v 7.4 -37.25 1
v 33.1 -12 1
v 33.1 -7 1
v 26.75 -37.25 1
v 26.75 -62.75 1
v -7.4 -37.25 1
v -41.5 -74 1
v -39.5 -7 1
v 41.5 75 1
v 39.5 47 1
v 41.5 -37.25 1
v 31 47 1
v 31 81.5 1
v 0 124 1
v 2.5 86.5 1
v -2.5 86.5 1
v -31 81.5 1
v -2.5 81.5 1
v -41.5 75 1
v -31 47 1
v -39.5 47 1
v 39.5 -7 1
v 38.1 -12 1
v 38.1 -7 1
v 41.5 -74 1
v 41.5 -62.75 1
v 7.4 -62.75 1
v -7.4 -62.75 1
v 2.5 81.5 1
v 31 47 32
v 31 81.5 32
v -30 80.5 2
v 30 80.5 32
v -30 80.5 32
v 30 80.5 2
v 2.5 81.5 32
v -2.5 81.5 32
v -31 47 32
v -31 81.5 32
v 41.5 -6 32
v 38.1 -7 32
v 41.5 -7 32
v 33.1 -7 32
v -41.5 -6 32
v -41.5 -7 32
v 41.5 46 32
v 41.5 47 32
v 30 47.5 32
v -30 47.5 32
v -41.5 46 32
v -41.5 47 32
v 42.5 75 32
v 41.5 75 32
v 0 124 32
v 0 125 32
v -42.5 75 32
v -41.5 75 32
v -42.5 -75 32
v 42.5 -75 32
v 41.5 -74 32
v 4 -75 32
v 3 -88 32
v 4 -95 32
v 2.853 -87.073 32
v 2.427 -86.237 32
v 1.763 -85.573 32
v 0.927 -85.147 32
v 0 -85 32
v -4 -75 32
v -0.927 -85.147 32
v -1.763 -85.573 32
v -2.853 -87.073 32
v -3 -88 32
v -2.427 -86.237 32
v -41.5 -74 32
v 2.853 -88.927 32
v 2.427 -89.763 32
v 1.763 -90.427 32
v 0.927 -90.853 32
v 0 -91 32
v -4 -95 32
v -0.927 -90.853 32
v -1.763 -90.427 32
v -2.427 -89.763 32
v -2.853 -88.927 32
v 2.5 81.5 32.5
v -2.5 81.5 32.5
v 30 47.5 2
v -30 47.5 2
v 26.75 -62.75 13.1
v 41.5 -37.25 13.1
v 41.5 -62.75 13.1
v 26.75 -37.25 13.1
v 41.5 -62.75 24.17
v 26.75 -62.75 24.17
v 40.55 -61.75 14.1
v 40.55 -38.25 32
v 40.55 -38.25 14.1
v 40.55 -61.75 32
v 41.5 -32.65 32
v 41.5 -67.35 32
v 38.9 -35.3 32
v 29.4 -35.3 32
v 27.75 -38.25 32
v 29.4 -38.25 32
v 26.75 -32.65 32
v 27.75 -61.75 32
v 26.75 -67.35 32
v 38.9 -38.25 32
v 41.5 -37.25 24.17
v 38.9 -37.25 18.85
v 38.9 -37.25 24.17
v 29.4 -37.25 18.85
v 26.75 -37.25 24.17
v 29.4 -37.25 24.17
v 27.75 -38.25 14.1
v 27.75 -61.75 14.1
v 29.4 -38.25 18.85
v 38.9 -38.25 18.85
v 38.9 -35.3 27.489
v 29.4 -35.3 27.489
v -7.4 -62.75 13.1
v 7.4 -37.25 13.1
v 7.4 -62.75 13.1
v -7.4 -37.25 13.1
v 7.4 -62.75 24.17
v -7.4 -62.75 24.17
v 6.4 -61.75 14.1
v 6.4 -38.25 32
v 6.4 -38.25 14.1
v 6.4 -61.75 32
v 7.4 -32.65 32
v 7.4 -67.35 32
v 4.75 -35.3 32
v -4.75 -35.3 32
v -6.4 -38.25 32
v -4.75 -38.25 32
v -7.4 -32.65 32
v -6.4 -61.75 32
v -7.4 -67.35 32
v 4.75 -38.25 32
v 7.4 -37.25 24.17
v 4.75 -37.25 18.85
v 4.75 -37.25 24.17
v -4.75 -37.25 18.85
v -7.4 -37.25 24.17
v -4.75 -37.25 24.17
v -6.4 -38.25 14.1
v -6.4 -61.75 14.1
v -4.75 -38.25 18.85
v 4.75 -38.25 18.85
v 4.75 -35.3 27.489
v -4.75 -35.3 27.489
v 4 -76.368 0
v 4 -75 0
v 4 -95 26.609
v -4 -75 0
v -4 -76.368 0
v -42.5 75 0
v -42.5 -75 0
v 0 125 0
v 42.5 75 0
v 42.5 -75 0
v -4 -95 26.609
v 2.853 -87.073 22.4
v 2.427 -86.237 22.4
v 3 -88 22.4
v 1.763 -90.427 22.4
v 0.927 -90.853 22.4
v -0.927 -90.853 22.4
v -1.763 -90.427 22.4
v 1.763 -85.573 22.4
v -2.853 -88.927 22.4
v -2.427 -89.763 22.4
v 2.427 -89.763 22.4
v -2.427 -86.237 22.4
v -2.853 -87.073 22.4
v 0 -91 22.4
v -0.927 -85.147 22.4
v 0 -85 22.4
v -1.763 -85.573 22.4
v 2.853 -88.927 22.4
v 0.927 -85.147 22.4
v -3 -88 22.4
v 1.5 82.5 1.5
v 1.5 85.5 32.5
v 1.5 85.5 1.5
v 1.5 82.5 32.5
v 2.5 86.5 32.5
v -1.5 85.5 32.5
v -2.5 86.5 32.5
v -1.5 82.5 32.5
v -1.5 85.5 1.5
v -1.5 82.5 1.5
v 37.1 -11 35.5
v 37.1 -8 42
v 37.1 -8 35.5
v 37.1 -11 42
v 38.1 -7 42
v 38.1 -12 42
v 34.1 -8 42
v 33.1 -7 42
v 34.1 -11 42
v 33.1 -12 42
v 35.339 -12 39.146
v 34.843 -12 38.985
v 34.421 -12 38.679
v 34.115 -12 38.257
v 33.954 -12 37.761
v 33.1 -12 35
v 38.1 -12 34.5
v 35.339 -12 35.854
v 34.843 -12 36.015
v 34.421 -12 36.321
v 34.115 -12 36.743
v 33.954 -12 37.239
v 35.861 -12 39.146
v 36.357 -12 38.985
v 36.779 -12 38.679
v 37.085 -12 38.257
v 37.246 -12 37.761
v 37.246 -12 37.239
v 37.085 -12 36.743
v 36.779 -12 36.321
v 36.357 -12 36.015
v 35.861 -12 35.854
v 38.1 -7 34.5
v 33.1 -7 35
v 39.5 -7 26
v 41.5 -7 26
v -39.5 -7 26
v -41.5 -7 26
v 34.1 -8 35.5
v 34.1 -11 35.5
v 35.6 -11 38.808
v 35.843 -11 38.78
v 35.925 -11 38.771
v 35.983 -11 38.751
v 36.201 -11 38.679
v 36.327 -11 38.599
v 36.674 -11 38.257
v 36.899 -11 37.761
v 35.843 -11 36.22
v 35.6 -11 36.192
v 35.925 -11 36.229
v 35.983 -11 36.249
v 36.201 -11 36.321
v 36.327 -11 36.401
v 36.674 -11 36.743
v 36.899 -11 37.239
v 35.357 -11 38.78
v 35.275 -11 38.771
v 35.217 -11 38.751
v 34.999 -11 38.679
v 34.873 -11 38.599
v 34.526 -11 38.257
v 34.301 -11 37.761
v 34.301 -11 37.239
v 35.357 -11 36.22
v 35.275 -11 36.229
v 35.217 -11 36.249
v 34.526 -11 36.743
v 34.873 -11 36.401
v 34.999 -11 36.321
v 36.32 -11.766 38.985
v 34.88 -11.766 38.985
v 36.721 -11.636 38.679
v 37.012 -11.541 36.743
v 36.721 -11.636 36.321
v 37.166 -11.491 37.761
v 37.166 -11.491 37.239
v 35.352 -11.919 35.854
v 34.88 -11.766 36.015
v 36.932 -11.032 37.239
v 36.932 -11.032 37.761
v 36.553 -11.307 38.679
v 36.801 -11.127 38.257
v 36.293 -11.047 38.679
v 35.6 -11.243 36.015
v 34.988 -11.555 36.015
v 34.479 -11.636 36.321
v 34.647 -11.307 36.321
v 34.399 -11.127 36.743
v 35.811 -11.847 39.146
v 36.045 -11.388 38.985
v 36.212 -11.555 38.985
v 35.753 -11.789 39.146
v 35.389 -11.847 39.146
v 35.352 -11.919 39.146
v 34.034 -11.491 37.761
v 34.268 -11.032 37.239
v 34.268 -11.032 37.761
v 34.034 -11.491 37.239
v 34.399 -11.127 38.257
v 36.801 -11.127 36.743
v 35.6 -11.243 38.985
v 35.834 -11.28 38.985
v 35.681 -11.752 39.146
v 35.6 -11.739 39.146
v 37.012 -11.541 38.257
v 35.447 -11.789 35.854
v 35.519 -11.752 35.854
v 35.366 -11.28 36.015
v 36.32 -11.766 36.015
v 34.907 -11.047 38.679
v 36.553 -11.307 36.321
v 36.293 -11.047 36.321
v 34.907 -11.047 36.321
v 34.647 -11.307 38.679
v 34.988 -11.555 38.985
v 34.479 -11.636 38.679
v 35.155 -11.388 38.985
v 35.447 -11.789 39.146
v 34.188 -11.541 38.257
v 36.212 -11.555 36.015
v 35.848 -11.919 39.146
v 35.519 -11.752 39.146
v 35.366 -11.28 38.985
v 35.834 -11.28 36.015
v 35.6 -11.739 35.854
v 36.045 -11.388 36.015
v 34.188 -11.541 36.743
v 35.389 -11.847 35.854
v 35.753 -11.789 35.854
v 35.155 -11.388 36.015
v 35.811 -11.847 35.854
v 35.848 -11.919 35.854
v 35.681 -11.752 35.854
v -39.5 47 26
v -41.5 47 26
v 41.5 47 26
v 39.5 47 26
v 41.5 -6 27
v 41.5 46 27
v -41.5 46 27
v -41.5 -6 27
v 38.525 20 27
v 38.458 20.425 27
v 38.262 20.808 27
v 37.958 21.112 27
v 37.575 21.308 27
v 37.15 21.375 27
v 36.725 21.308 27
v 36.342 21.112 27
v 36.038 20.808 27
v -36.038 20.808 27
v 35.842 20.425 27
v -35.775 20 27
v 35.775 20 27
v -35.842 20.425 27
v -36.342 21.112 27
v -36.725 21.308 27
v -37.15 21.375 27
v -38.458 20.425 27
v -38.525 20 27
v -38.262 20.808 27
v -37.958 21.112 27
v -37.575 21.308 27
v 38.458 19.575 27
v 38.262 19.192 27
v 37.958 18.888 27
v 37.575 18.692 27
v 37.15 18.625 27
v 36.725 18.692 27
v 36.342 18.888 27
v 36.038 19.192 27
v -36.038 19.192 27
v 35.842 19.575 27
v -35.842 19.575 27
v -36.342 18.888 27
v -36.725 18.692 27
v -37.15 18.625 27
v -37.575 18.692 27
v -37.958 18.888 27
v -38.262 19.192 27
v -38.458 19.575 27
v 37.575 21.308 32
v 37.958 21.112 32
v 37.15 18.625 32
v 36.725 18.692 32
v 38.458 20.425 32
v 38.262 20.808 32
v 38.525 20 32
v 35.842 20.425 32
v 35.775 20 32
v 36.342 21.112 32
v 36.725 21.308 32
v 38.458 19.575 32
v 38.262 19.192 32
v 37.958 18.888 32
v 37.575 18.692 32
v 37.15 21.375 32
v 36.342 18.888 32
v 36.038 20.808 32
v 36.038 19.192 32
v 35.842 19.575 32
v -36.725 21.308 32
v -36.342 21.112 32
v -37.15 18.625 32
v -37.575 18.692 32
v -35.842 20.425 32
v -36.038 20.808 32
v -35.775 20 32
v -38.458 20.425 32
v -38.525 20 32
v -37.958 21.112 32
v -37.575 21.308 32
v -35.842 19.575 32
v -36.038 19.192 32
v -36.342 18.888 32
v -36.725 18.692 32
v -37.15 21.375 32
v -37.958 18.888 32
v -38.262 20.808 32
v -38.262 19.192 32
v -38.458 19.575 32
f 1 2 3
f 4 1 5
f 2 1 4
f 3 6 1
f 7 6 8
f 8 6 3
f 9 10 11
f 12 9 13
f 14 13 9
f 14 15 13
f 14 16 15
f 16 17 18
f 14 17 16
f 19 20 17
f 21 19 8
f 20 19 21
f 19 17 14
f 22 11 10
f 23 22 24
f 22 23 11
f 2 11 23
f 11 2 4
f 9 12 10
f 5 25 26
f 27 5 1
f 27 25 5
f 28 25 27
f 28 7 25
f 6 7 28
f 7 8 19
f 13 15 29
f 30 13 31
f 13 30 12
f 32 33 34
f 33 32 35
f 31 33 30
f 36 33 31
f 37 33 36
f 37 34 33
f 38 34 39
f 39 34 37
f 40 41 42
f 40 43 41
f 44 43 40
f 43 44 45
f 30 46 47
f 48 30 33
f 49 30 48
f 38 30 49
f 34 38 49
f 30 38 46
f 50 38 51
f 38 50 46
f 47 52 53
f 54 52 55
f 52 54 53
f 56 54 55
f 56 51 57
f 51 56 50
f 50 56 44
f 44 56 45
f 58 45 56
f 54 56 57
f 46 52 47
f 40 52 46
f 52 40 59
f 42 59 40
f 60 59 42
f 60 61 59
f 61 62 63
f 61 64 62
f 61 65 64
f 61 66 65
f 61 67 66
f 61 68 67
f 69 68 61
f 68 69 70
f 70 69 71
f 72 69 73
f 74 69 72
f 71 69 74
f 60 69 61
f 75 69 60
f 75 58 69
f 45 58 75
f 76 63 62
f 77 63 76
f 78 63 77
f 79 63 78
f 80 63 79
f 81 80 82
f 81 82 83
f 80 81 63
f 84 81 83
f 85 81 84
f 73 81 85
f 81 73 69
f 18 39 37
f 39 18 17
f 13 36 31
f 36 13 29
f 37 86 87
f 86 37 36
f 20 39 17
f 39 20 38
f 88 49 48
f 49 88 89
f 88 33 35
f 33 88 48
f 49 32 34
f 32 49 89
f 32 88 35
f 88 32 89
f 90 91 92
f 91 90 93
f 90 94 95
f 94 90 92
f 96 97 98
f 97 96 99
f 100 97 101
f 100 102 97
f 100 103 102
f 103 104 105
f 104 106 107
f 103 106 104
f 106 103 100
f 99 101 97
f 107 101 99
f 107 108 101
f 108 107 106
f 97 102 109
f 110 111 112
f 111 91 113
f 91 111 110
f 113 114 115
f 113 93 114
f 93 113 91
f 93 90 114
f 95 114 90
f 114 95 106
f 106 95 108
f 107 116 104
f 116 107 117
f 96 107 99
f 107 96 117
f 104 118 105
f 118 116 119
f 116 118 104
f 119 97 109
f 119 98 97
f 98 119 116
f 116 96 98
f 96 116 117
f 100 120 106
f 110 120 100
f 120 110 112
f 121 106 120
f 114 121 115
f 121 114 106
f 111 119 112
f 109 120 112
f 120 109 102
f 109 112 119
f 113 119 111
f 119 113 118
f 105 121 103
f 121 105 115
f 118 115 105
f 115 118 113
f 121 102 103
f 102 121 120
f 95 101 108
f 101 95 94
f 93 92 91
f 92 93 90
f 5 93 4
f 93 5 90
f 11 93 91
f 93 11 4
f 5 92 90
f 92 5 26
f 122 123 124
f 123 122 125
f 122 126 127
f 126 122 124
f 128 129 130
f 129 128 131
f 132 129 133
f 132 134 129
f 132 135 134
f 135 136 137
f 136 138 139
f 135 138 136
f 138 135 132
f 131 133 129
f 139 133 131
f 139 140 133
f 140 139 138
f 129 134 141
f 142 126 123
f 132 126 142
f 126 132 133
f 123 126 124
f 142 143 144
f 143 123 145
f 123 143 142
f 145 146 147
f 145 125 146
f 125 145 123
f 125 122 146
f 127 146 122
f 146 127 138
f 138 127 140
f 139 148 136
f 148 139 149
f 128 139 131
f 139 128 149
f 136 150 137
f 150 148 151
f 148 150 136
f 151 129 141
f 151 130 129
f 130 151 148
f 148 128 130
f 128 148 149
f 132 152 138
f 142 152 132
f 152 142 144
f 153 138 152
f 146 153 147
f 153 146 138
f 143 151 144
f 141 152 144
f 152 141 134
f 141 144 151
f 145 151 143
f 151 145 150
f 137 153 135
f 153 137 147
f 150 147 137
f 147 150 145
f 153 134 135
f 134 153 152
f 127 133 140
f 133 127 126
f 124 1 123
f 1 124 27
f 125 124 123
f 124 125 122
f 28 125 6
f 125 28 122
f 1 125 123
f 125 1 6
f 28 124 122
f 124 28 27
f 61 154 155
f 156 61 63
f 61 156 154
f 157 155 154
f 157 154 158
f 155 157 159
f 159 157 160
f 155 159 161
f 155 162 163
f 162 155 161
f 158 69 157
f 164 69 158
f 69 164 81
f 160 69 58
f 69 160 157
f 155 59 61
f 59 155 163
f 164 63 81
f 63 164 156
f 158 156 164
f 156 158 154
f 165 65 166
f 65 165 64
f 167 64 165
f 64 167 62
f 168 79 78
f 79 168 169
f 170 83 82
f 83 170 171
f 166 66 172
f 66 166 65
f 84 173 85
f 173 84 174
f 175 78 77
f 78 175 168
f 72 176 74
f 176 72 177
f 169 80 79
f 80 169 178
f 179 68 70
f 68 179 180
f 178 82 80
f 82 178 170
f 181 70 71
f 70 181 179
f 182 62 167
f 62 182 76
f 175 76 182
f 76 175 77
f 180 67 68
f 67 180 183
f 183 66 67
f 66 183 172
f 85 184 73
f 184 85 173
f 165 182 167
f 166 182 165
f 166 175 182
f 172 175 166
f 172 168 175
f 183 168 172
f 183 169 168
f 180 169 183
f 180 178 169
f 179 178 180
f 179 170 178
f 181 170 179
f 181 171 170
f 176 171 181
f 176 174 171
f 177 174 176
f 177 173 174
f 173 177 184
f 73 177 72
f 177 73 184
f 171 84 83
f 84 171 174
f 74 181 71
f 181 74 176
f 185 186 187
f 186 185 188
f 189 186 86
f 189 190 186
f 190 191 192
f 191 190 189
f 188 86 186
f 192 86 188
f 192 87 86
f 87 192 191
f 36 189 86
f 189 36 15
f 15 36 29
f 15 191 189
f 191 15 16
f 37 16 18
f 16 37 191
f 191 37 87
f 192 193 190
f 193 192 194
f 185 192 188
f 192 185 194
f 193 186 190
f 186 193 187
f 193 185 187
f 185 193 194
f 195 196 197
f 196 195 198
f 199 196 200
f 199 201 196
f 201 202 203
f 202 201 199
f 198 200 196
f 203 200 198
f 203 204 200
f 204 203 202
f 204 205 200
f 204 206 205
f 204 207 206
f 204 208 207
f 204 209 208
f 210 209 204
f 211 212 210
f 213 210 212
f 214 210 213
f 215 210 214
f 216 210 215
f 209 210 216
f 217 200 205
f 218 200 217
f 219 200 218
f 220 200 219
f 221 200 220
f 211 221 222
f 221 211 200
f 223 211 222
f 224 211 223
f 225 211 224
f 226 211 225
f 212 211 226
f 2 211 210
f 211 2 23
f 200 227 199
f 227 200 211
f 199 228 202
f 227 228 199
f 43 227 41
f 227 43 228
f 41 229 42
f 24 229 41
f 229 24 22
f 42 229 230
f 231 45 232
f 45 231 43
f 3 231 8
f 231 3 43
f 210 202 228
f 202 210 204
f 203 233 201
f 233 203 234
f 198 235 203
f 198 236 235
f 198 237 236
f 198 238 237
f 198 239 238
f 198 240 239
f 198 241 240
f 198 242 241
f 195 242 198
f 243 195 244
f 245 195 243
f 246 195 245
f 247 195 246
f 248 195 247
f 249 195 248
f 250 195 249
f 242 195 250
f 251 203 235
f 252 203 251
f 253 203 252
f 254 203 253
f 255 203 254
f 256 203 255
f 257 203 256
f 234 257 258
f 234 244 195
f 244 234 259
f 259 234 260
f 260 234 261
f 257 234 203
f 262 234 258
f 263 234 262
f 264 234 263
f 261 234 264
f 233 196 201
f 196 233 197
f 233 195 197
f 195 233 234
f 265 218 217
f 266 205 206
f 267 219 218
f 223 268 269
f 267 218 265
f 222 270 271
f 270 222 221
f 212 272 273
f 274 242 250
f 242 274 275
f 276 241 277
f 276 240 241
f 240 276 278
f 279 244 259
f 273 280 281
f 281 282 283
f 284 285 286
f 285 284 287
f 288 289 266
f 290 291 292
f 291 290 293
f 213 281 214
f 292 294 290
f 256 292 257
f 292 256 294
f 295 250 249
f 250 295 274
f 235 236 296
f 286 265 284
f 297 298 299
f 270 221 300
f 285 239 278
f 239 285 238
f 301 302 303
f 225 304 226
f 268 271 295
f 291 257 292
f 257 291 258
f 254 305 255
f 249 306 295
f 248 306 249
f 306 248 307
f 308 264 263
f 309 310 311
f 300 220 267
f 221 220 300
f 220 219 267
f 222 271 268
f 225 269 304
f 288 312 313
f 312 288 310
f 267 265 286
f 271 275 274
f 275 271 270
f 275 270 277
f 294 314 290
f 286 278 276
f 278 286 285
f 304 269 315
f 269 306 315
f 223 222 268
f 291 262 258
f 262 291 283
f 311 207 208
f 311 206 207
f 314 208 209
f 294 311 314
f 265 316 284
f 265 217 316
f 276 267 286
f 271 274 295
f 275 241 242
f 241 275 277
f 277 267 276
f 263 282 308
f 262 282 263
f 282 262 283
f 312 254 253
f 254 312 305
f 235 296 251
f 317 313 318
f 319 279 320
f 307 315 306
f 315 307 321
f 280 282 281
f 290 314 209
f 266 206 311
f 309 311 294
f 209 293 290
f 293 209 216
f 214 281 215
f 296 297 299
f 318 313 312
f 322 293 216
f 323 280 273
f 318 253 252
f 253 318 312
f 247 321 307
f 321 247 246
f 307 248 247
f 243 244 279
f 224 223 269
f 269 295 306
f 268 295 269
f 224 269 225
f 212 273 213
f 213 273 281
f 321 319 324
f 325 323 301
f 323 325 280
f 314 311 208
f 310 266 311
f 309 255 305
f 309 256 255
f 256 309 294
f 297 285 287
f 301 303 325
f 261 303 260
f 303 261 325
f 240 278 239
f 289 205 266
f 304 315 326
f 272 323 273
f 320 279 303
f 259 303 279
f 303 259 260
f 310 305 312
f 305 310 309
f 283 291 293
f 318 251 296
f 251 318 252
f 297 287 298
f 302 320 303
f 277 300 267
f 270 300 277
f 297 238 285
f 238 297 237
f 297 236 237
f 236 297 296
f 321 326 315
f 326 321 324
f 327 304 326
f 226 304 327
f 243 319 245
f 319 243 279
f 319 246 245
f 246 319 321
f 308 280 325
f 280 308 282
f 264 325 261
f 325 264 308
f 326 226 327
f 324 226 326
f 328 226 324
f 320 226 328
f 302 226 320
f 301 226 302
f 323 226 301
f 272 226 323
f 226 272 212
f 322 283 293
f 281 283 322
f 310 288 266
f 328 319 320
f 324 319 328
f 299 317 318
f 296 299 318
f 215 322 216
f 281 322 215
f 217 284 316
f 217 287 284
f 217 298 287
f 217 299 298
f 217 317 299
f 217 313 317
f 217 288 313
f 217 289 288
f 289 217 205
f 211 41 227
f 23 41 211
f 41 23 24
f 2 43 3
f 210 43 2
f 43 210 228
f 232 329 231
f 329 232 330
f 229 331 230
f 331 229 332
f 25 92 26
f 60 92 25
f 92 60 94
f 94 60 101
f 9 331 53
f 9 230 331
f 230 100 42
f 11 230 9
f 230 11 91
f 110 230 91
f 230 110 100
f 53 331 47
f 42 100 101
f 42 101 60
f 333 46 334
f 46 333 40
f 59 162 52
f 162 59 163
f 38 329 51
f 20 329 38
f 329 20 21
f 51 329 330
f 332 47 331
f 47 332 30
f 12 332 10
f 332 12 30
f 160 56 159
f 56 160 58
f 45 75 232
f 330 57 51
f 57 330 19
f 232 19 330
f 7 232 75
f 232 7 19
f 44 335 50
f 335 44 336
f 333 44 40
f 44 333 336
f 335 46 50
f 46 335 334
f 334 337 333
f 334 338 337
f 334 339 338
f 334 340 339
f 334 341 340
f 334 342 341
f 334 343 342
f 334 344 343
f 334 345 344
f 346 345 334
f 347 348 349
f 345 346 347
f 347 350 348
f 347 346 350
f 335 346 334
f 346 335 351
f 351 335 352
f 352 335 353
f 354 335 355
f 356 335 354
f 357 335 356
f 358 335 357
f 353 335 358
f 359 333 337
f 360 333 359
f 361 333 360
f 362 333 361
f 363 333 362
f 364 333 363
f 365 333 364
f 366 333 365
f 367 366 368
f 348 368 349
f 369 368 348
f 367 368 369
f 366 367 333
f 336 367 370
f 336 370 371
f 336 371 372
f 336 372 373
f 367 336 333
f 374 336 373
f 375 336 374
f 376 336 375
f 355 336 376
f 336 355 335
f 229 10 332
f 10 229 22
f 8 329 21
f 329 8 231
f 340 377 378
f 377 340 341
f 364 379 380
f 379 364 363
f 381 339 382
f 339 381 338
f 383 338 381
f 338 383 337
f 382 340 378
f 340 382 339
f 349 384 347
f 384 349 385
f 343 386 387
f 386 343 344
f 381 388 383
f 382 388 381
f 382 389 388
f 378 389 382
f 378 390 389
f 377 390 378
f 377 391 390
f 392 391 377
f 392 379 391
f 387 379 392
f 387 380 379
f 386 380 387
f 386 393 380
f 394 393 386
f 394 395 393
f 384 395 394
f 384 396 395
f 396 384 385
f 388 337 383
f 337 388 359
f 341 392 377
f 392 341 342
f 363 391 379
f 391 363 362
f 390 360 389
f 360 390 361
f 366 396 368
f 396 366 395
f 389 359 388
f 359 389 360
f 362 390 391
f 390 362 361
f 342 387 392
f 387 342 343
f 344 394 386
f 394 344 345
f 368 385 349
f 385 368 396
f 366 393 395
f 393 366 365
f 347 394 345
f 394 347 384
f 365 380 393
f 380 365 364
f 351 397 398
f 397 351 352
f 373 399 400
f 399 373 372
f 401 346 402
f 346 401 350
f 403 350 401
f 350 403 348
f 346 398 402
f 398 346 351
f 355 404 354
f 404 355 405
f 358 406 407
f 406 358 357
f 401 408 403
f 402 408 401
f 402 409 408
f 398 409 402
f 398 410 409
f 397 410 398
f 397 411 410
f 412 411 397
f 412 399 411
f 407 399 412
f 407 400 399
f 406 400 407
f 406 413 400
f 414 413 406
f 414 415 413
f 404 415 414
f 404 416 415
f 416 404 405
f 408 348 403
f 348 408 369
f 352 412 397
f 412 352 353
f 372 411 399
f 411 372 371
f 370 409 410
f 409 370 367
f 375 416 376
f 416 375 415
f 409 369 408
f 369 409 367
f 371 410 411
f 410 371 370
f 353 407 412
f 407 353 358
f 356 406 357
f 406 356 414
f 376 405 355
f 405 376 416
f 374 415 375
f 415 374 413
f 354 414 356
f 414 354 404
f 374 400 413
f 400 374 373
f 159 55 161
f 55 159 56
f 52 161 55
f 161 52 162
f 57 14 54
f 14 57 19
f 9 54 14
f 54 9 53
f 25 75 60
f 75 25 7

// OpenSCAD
// TODO:
// Widen the spot for protoboard. Switch to 2 pegs, w/ proper diameter. Tray?
// Measure servo horns, ensure enough room for them
// Make mast/boom holes smaller?
// 3 (4?) levels: keel, electronics, deck
// In Blender:
// Rework rudder fin, center of gravity
// Narrow the back of the boat

BOAT_WIDTH = 85;
BOAT_LENGTH = 200;
BOAT_DEPTH = 32;
HULL_THICKNESS = 1;

BATTERY_SIZE_PADDING = 2;
BATTERY_INNER_WIDTH = 32 + BATTERY_SIZE_PADDING;
BATTERY_INNER_LENGTH = 59 + BATTERY_SIZE_PADDING;
BATTERY_INNER_HEIGHT = 28 + BATTERY_SIZE_PADDING;
BATTERY_BOX_THICKNESS = 1;
BATTERY_FORWARD_TRANSLATE = 64;

SERVO_SIZE_PADDING = 2;
SERVO_INNER_WIDTH = 11.8 + SERVO_SIZE_PADDING;
SERVO_INNER_LENGTH = 22.5 + SERVO_SIZE_PADDING;
SERVO_INNER_HEIGHT = 15.9 + SERVO_SIZE_PADDING;
SERVO_BOX_THICKNESS = 1;
SERVO_CONNECTOR_WIDTH = 9.5;

MAST_DIAMETER = 4;
MAST_PADDING = 0.5;
MAST_MOUNT_THICKNESS = 1;
MAST_MOUNT_INNER_DIAMETER = MAST_DIAMETER + 2*(MAST_PADDING);
MAST_HEIGHT = 150;
MAST_FORWARD_TRANSLATE = BATTERY_FORWARD_TRANSLATE + BATTERY_INNER_WIDTH/2 + BATTERY_BOX_THICKNESS/2 + MAST_MOUNT_INNER_DIAMETER/2;

MSR_RAIL_WIDTH = MAST_MOUNT_INNER_DIAMETER*1;
MSR_RAIL_LENGTH = 14;
MSR_RAIL_HEIGHT = 10;

BOOM_LENGTH = BOAT_LENGTH*.75;
RING_OUTER_RADIUS = 3;
RING_INNER_RADIUS = 2;

RAIL_WIDTH = (BOAT_WIDTH-BATTERY_INNER_WIDTH-BATTERY_BOX_THICKNESS)/2-HULL_THICKNESS;
RAIL_LENGTH = 40;
RAIL_HEIGHT = BOAT_DEPTH;

RUDDER_MOUNT_WIDTH = 8;
RUDDER_MOUNT_LENGTH = 20;
RUDDER_WIDTH = RUDDER_MOUNT_WIDTH - 2;
RUDDER_PIVOT_DIAMETER = RUDDER_WIDTH/2;
RUDDER_PIVOT_HOLE_DIAMETER = RUDDER_MOUNT_WIDTH/2 - 1;

CIRCUIT_BOARD_TRAY_THICKNESS = 1;
CIRCUIT_BOARD_WIDTH = 84 + CIRCUIT_BOARD_TRAY_THICKNESS; // measured 81.21
CIRCUIT_BOARD_LENGTH = 53 + CIRCUIT_BOARD_TRAY_THICKNESS; // measured 50.73
CIRCUIT_BOARD_DEPTH = 5 + CIRCUIT_BOARD_TRAY_THICKNESS; // depth of tray, not board
CIRCUIT_BOARD_HOLE_DIAMETER = 2.75; // measured 3.2

//all();
module all() {
  boat();
  mast();
  boom();
  translate([-130, 0, 5]) {
    rotate([0, 90, 90]) {
      rudder();
    }
  }
}

boat();
module boat() {
  hull();
  batteryBox();
  sailServo();
  rudderServo();
  rudderMount();
  mastMount();
  mainSheetRing();
  circuitBoardTray();
}

module hull() {
  aftLength = BOAT_LENGTH * .75;
  foreLength = BOAT_LENGTH - aftLength;
  polyhedron(
    points = [
      // Underside
      [0, aftLength/2 + foreLength, 0],
      [-BOAT_WIDTH/2, aftLength/2, 0],
      [-BOAT_WIDTH/2, -aftLength/2, 0],
      [BOAT_WIDTH/2, -aftLength/2, 0],
      [BOAT_WIDTH/2, aftLength/2, 0],

      // Top outside
      [0, aftLength/2 + foreLength, BOAT_DEPTH],
      [-BOAT_WIDTH/2, aftLength/2, BOAT_DEPTH],
      [-BOAT_WIDTH/2, -aftLength/2, BOAT_DEPTH],
      [BOAT_WIDTH/2, -aftLength/2, BOAT_DEPTH],
      [BOAT_WIDTH/2, aftLength/2, BOAT_DEPTH],

      // Top inside
      [0, aftLength/2 + foreLength - HULL_THICKNESS, BOAT_DEPTH],
      [-BOAT_WIDTH/2+HULL_THICKNESS, aftLength/2, BOAT_DEPTH],
      [-BOAT_WIDTH/2+HULL_THICKNESS, HULL_THICKNESS-aftLength/2, BOAT_DEPTH],
      [BOAT_WIDTH/2-HULL_THICKNESS, HULL_THICKNESS-aftLength/2, BOAT_DEPTH],
      [BOAT_WIDTH/2-HULL_THICKNESS, aftLength/2, BOAT_DEPTH],

      // Floor
      [0, aftLength/2 + foreLength - HULL_THICKNESS, HULL_THICKNESS],
      [-BOAT_WIDTH/2+HULL_THICKNESS, aftLength/2, HULL_THICKNESS],
      [-BOAT_WIDTH/2+HULL_THICKNESS, HULL_THICKNESS-aftLength/2, HULL_THICKNESS],
      [BOAT_WIDTH/2-HULL_THICKNESS, HULL_THICKNESS-aftLength/2, HULL_THICKNESS],
      [BOAT_WIDTH/2-HULL_THICKNESS, aftLength/2, HULL_THICKNESS],
    ],
    faces = [
      // Underside
      [3, 1, 2],
      [3, 4, 1],
      [1, 4, 0],

      // Outer Walls
      [2, 1, 7],
      [7, 1, 6],
      [1, 0, 6],
      [6, 0, 5],
      [0, 4, 5],
      [5, 4, 9],
      [4, 3, 8],
      [8, 9, 4],
      [3, 2, 7],
      [3, 7, 8],

      // Inner Walls
      [12, 11, 17],
      [17, 11, 16],
      [11, 10, 16],
      [16, 10, 15],
      [10, 14, 15],
      [15, 14, 19],
      [14, 13, 18],
      [18, 19, 14],
      [13, 12, 17],
      [13, 17, 18],
      
      // Top of railing
      [8, 14, 9],
      [8, 13, 14],
      [9, 14, 10],
      [9, 10, 5],
      [5, 11, 6],
      [5, 10, 11],
      [7, 6, 11],
      [7, 11, 12],
      [7, 13, 8],
      [7, 12, 13],

      // Floor
      [18, 17, 16],
      [18, 16, 19],
      [16, 15, 19],
    ]
  );
}

module batteryBox() {
  color("red") {
    translate([0, BATTERY_FORWARD_TRANSLATE, HULL_THICKNESS]) {
      rotate([0, 0, 90]) {
        openTopBox(BATTERY_INNER_WIDTH+BATTERY_BOX_THICKNESS,
                   BATTERY_INNER_LENGTH+BATTERY_BOX_THICKNESS,
                   BATTERY_INNER_HEIGHT+BATTERY_BOX_THICKNESS,
                   BATTERY_BOX_THICKNESS);
      }
    }
  }
}

module servoBox() {
  servoOuterHeight = SERVO_INNER_HEIGHT + SERVO_BOX_THICKNESS;
  color("blue") {
    translate([0, 0, BOAT_DEPTH-SERVO_INNER_HEIGHT-HULL_THICKNESS]) {
      difference() {
        union() {
          openTopBox(SERVO_INNER_WIDTH+SERVO_BOX_THICKNESS,
                     SERVO_INNER_LENGTH+SERVO_BOX_THICKNESS,
                     servoOuterHeight, SERVO_BOX_THICKNESS);
          // Wire-side mount
          translate([0,15,14.9]) {
            rotate([0,90,90]) {
              prism(8, SERVO_INNER_WIDTH+SERVO_BOX_THICKNESS, 4.7);
            }
          }
        } //union
        // Connector hole
        translate([SERVO_CONNECTOR_WIDTH*-.5,
                   SERVO_INNER_LENGTH/2 - 1,
                   SERVO_BOX_THICKNESS+4.75]) {
          cube([SERVO_CONNECTOR_WIDTH, 3, 4]);
        }
        // Wire channel cutout
        translate([SERVO_CONNECTOR_WIDTH*-.5, 10, 8]) {
          cube([SERVO_CONNECTOR_WIDTH,
                4.7,
                SERVO_INNER_HEIGHT-6.75], false);
        }
      } //difference
      // Non-wire-side mount
      translate([0,-15,14.9]) {
        rotate([0,90,-90]) {
          prism(8, SERVO_INNER_WIDTH+SERVO_BOX_THICKNESS, 4.7);
        }
      }
    }
    // Stand
    translate([0, 0, (HULL_THICKNESS+BOAT_DEPTH-servoOuterHeight)/2]) {
      cube([SERVO_INNER_WIDTH+SERVO_BOX_THICKNESS, SERVO_INNER_LENGTH+SERVO_BOX_THICKNESS, BOAT_DEPTH-servoOuterHeight-HULL_THICKNESS], true);
    }
  }
}

module sailServo() {
  translate([(BOAT_WIDTH-SERVO_INNER_WIDTH)/2+SERVO_BOX_THICKNESS - 2.45, -50, 0]) {
    servoBox();
  }
}

module rudderServo() {
  translate([0, -50, 0]) {
    servoBox();
  }
}


module mainSheetRing() {
  color("orange") {
    translate([(BOAT_WIDTH-SERVO_INNER_WIDTH)/2, -9.5, BOAT_DEPTH/2+2]) {
        cube([MAST_MOUNT_INNER_DIAMETER,
              MAST_MOUNT_INNER_DIAMETER,
              BOAT_DEPTH+2], true);
    }
    translate([(BOAT_WIDTH-SERVO_INNER_WIDTH)/2, -9.5, BOAT_DEPTH+2.5]) {
      difference() {
        openTopBox(MAST_MOUNT_INNER_DIAMETER,
                   MAST_MOUNT_INNER_DIAMETER,
                   7.5,
                   MAST_MOUNT_THICKNESS);
        translate([0, -MAST_MOUNT_INNER_DIAMETER/2, 3]) {
          sphere(MAST_MOUNT_INNER_DIAMETER/3, $fn=20);
        }
      }
    }
  }
}

module rudderMount() {
  color("orange") {
    translate([0, -79, 0]) {
      translate([-RUDDER_MOUNT_WIDTH/2,
                 4-RUDDER_MOUNT_LENGTH,
                 0]) {
        difference() {
          cube([RUDDER_MOUNT_WIDTH,
                RUDDER_MOUNT_LENGTH,
                BOAT_DEPTH]);
          translate([-20, -20, -32]) {
            rotate([35, 0, 0]) {
              cube([50, 50, 50]);
            }
          }
          translate([RUDDER_MOUNT_WIDTH/2, 7, BOAT_DEPTH*.7]) {
            cylinder($fn=20, BOAT_DEPTH*.5,
                     RUDDER_PIVOT_HOLE_DIAMETER, RUDDER_PIVOT_HOLE_DIAMETER);
          }
        }
      }
    }
  }
}

module rudder() {
  color("green") {
    translate([0,
               -RUDDER_MOUNT_LENGTH-42,
               BOAT_DEPTH*.75]) {
      translate([0, -6, -2]) {
        cylinder($fn=20, BOAT_DEPTH*.4,
                 RUDDER_PIVOT_DIAMETER, RUDDER_PIVOT_DIAMETER);
      }
      // Servo wire mount
      translate([RUDDER_WIDTH/-2, -RUDDER_PIVOT_DIAMETER-6, 10]) {
        cube([RUDDER_WIDTH, 14.8, 10]);
      }
      // Biggest part
      translate([-RUDDER_WIDTH/2, -24.2, BOAT_DEPTH*.25]) {
        cube([RUDDER_WIDTH, RUDDER_MOUNT_LENGTH*1.5, BOAT_DEPTH*.25]);
      }
      // Part that goes down
      translate([RUDDER_WIDTH/-2, -24.2, -BOAT_DEPTH*.5]) {
        cube([RUDDER_WIDTH, 10, BOAT_DEPTH]);
      }
      translate([RUDDER_WIDTH/-2, -8, -40]) {
        rotate([35, 0, 0]) {
          cube([RUDDER_WIDTH, 18, 40]);
        }
      }
    }
  }
}

module mastMount() {
  translate([0, MAST_FORWARD_TRANSLATE, 0.5]) {
    color("orange") {
      openTopBox(MAST_MOUNT_INNER_DIAMETER, MAST_MOUNT_INNER_DIAMETER, BOAT_DEPTH, MAST_MOUNT_THICKNESS);
    }
  }
}

module mast() {
  color("orange") {
    translate([BOAT_WIDTH, BOAT_LENGTH*-.375, 0]) {
      cube([MAST_DIAMETER, MAST_HEIGHT, MAST_DIAMETER]);
      ring(BOAT_DEPTH+5);
      ring(BOAT_DEPTH+15);
      ring(BOAT_DEPTH+35);
      ring(BOAT_DEPTH+55);
      ring(BOAT_DEPTH+75);
      ring(BOAT_DEPTH+95);
      ring(BOAT_DEPTH+113);
    }
  }
}

module ring(pos) {
  translate([-1+RING_OUTER_RADIUS-MAST_DIAMETER/2, pos+MAST_DIAMETER/2, 0]) {
    difference() {
      cylinder($fn=20, MAST_DIAMETER, RING_OUTER_RADIUS, RING_OUTER_RADIUS);
      cylinder($fn=20, MAST_DIAMETER, RING_INNER_RADIUS, RING_INNER_RADIUS);
    }
  }
}

module boom() {
  color("orange") {
    translate([BOAT_WIDTH*.75, -BOOM_LENGTH/2, 0]) {
      cube([MAST_DIAMETER, BOOM_LENGTH, MAST_DIAMETER]);
      translate([2,0,0]) {
        ring(-3);
      }
      ring(22.3);
      ring(43.6);
      ring(64.9);
      ring(86.2);
      ring(107.5);
    }
  }
}

module circuitBoardTray() {
  translate([0, 20, BOAT_DEPTH-CIRCUIT_BOARD_DEPTH]) {
    openTopBox(CIRCUIT_BOARD_WIDTH, CIRCUIT_BOARD_LENGTH, CIRCUIT_BOARD_DEPTH, 1);
    translate([0, 0, -(BOAT_DEPTH-CIRCUIT_BOARD_DEPTH-HULL_THICKNESS)/2]) {
      cube([CIRCUIT_BOARD_WIDTH-6,
            CIRCUIT_BOARD_LENGTH,
            BOAT_DEPTH-CIRCUIT_BOARD_DEPTH], true);
    }
    translate([37.15, 0, 0]) {
      cylinder($fn=20, h=CIRCUIT_BOARD_DEPTH, d=CIRCUIT_BOARD_HOLE_DIAMETER);
    }
    translate([-37.15, 0, 0]) {
      cylinder($fn=20, h=CIRCUIT_BOARD_DEPTH, d=CIRCUIT_BOARD_HOLE_DIAMETER);
    }
  }
}

module peg() {
  cylinder($fn=20, 4, 2, 2);
}

module pegs() {
  color("orange") {
    // Left rail
    translate([-((BOAT_WIDTH)/2-HULL_THICKNESS), 10, BOAT_DEPTH-RAIL_HEIGHT]) {
      cube([RAIL_WIDTH, RAIL_LENGTH, RAIL_HEIGHT]);
    }
    // Right rail
    translate([((BOAT_WIDTH)/2-HULL_THICKNESS-RAIL_WIDTH), 10, BOAT_DEPTH-RAIL_HEIGHT]) {
      cube([RAIL_WIDTH, RAIL_LENGTH, RAIL_HEIGHT]);
    }
    translate([-20, 40, BOAT_DEPTH]) {
      peg();
    }
    translate([20, 40, BOAT_DEPTH]) {
      peg();
    }
    translate([-20, 20, BOAT_DEPTH]) {
      peg();
    }
    translate([20, 20, BOAT_DEPTH]) {
      peg();
    }
  }
}

// Makes a box with the given outer dimensions but no top
module openTopBox(w, d, h, thickness=1.0, includeFrontWall=true, includeFloor=true) {
  translate([(w-thickness)/2, 0, 0]) {
    wall(d, h, 90, thickness);
  }
  translate([(w-thickness)/-2, 0, 0]) {
    wall(d, h, 90, thickness);
  }
  translate([0, (d-thickness)/-2, 0]) {
    wall(w, h, 0, thickness);
  }
  if (includeFrontWall) {
    translate([0, (d-thickness)/2, 0]) {
      wall(w, h, 0, thickness);
    }
  }
  if (includeFloor) {
    translate([0, d/2, thickness/2]) {
      rotate([90, 0, 0]) {
        wall(w, d, 0, thickness);
      }
    }
  }
}

// Makes a wall (a closed box) with specified width, height
// Origin will be on the floor, in the middle of the box
module wall(w, h, r=0.0, thickness=1.0) {
  rotate([0, 0, r]) {
  polyhedron(
    points = [
      [-w/2, -thickness/2, 0], // 0
      [w/2, -thickness/2, 0],  // 1
      [w/2, thickness/2, 0],   // 2
      [-w/2, thickness/2, 0],  // 3
      [-w/2, -thickness/2, h], // 4
      [w/2, -thickness/2, h],  // 5
      [w/2, thickness/2, h],   // 6
      [-w/2, thickness/2, h],  // 7
    ],
    faces = [
      [0, 1, 2],
      [2, 3, 0],
      [4, 6, 5],
      [6, 4, 7],
      [0, 4, 1],
      [4, 5, 1],
      [2, 6, 3],
      [6, 7, 3],
      [0, 3, 4],
      [4, 3, 7],
      [1, 5, 2],
      [5, 6, 2],
    ]
  );
  }
}

module prism(w, l, h) {
  polyhedron(
    points = [
      [w/2, l/2, -h/2],
      [w/2, -l/2, -h/2],
      [-w/2, l/2, h/2],
      [-w/2, l/2, -h/2],
      [-w/2, -l/2, h/2],
      [-w/2, -l/2, -h/2],
    ],
    faces = [
      [1, 5, 4],
      [0, 2, 3],
      [2, 4, 5],
      [2, 5, 3],
      [0, 3, 5],
      [0, 5, 1],
      [1, 4, 2],
      [1, 2, 0],
    ]
  );
}
